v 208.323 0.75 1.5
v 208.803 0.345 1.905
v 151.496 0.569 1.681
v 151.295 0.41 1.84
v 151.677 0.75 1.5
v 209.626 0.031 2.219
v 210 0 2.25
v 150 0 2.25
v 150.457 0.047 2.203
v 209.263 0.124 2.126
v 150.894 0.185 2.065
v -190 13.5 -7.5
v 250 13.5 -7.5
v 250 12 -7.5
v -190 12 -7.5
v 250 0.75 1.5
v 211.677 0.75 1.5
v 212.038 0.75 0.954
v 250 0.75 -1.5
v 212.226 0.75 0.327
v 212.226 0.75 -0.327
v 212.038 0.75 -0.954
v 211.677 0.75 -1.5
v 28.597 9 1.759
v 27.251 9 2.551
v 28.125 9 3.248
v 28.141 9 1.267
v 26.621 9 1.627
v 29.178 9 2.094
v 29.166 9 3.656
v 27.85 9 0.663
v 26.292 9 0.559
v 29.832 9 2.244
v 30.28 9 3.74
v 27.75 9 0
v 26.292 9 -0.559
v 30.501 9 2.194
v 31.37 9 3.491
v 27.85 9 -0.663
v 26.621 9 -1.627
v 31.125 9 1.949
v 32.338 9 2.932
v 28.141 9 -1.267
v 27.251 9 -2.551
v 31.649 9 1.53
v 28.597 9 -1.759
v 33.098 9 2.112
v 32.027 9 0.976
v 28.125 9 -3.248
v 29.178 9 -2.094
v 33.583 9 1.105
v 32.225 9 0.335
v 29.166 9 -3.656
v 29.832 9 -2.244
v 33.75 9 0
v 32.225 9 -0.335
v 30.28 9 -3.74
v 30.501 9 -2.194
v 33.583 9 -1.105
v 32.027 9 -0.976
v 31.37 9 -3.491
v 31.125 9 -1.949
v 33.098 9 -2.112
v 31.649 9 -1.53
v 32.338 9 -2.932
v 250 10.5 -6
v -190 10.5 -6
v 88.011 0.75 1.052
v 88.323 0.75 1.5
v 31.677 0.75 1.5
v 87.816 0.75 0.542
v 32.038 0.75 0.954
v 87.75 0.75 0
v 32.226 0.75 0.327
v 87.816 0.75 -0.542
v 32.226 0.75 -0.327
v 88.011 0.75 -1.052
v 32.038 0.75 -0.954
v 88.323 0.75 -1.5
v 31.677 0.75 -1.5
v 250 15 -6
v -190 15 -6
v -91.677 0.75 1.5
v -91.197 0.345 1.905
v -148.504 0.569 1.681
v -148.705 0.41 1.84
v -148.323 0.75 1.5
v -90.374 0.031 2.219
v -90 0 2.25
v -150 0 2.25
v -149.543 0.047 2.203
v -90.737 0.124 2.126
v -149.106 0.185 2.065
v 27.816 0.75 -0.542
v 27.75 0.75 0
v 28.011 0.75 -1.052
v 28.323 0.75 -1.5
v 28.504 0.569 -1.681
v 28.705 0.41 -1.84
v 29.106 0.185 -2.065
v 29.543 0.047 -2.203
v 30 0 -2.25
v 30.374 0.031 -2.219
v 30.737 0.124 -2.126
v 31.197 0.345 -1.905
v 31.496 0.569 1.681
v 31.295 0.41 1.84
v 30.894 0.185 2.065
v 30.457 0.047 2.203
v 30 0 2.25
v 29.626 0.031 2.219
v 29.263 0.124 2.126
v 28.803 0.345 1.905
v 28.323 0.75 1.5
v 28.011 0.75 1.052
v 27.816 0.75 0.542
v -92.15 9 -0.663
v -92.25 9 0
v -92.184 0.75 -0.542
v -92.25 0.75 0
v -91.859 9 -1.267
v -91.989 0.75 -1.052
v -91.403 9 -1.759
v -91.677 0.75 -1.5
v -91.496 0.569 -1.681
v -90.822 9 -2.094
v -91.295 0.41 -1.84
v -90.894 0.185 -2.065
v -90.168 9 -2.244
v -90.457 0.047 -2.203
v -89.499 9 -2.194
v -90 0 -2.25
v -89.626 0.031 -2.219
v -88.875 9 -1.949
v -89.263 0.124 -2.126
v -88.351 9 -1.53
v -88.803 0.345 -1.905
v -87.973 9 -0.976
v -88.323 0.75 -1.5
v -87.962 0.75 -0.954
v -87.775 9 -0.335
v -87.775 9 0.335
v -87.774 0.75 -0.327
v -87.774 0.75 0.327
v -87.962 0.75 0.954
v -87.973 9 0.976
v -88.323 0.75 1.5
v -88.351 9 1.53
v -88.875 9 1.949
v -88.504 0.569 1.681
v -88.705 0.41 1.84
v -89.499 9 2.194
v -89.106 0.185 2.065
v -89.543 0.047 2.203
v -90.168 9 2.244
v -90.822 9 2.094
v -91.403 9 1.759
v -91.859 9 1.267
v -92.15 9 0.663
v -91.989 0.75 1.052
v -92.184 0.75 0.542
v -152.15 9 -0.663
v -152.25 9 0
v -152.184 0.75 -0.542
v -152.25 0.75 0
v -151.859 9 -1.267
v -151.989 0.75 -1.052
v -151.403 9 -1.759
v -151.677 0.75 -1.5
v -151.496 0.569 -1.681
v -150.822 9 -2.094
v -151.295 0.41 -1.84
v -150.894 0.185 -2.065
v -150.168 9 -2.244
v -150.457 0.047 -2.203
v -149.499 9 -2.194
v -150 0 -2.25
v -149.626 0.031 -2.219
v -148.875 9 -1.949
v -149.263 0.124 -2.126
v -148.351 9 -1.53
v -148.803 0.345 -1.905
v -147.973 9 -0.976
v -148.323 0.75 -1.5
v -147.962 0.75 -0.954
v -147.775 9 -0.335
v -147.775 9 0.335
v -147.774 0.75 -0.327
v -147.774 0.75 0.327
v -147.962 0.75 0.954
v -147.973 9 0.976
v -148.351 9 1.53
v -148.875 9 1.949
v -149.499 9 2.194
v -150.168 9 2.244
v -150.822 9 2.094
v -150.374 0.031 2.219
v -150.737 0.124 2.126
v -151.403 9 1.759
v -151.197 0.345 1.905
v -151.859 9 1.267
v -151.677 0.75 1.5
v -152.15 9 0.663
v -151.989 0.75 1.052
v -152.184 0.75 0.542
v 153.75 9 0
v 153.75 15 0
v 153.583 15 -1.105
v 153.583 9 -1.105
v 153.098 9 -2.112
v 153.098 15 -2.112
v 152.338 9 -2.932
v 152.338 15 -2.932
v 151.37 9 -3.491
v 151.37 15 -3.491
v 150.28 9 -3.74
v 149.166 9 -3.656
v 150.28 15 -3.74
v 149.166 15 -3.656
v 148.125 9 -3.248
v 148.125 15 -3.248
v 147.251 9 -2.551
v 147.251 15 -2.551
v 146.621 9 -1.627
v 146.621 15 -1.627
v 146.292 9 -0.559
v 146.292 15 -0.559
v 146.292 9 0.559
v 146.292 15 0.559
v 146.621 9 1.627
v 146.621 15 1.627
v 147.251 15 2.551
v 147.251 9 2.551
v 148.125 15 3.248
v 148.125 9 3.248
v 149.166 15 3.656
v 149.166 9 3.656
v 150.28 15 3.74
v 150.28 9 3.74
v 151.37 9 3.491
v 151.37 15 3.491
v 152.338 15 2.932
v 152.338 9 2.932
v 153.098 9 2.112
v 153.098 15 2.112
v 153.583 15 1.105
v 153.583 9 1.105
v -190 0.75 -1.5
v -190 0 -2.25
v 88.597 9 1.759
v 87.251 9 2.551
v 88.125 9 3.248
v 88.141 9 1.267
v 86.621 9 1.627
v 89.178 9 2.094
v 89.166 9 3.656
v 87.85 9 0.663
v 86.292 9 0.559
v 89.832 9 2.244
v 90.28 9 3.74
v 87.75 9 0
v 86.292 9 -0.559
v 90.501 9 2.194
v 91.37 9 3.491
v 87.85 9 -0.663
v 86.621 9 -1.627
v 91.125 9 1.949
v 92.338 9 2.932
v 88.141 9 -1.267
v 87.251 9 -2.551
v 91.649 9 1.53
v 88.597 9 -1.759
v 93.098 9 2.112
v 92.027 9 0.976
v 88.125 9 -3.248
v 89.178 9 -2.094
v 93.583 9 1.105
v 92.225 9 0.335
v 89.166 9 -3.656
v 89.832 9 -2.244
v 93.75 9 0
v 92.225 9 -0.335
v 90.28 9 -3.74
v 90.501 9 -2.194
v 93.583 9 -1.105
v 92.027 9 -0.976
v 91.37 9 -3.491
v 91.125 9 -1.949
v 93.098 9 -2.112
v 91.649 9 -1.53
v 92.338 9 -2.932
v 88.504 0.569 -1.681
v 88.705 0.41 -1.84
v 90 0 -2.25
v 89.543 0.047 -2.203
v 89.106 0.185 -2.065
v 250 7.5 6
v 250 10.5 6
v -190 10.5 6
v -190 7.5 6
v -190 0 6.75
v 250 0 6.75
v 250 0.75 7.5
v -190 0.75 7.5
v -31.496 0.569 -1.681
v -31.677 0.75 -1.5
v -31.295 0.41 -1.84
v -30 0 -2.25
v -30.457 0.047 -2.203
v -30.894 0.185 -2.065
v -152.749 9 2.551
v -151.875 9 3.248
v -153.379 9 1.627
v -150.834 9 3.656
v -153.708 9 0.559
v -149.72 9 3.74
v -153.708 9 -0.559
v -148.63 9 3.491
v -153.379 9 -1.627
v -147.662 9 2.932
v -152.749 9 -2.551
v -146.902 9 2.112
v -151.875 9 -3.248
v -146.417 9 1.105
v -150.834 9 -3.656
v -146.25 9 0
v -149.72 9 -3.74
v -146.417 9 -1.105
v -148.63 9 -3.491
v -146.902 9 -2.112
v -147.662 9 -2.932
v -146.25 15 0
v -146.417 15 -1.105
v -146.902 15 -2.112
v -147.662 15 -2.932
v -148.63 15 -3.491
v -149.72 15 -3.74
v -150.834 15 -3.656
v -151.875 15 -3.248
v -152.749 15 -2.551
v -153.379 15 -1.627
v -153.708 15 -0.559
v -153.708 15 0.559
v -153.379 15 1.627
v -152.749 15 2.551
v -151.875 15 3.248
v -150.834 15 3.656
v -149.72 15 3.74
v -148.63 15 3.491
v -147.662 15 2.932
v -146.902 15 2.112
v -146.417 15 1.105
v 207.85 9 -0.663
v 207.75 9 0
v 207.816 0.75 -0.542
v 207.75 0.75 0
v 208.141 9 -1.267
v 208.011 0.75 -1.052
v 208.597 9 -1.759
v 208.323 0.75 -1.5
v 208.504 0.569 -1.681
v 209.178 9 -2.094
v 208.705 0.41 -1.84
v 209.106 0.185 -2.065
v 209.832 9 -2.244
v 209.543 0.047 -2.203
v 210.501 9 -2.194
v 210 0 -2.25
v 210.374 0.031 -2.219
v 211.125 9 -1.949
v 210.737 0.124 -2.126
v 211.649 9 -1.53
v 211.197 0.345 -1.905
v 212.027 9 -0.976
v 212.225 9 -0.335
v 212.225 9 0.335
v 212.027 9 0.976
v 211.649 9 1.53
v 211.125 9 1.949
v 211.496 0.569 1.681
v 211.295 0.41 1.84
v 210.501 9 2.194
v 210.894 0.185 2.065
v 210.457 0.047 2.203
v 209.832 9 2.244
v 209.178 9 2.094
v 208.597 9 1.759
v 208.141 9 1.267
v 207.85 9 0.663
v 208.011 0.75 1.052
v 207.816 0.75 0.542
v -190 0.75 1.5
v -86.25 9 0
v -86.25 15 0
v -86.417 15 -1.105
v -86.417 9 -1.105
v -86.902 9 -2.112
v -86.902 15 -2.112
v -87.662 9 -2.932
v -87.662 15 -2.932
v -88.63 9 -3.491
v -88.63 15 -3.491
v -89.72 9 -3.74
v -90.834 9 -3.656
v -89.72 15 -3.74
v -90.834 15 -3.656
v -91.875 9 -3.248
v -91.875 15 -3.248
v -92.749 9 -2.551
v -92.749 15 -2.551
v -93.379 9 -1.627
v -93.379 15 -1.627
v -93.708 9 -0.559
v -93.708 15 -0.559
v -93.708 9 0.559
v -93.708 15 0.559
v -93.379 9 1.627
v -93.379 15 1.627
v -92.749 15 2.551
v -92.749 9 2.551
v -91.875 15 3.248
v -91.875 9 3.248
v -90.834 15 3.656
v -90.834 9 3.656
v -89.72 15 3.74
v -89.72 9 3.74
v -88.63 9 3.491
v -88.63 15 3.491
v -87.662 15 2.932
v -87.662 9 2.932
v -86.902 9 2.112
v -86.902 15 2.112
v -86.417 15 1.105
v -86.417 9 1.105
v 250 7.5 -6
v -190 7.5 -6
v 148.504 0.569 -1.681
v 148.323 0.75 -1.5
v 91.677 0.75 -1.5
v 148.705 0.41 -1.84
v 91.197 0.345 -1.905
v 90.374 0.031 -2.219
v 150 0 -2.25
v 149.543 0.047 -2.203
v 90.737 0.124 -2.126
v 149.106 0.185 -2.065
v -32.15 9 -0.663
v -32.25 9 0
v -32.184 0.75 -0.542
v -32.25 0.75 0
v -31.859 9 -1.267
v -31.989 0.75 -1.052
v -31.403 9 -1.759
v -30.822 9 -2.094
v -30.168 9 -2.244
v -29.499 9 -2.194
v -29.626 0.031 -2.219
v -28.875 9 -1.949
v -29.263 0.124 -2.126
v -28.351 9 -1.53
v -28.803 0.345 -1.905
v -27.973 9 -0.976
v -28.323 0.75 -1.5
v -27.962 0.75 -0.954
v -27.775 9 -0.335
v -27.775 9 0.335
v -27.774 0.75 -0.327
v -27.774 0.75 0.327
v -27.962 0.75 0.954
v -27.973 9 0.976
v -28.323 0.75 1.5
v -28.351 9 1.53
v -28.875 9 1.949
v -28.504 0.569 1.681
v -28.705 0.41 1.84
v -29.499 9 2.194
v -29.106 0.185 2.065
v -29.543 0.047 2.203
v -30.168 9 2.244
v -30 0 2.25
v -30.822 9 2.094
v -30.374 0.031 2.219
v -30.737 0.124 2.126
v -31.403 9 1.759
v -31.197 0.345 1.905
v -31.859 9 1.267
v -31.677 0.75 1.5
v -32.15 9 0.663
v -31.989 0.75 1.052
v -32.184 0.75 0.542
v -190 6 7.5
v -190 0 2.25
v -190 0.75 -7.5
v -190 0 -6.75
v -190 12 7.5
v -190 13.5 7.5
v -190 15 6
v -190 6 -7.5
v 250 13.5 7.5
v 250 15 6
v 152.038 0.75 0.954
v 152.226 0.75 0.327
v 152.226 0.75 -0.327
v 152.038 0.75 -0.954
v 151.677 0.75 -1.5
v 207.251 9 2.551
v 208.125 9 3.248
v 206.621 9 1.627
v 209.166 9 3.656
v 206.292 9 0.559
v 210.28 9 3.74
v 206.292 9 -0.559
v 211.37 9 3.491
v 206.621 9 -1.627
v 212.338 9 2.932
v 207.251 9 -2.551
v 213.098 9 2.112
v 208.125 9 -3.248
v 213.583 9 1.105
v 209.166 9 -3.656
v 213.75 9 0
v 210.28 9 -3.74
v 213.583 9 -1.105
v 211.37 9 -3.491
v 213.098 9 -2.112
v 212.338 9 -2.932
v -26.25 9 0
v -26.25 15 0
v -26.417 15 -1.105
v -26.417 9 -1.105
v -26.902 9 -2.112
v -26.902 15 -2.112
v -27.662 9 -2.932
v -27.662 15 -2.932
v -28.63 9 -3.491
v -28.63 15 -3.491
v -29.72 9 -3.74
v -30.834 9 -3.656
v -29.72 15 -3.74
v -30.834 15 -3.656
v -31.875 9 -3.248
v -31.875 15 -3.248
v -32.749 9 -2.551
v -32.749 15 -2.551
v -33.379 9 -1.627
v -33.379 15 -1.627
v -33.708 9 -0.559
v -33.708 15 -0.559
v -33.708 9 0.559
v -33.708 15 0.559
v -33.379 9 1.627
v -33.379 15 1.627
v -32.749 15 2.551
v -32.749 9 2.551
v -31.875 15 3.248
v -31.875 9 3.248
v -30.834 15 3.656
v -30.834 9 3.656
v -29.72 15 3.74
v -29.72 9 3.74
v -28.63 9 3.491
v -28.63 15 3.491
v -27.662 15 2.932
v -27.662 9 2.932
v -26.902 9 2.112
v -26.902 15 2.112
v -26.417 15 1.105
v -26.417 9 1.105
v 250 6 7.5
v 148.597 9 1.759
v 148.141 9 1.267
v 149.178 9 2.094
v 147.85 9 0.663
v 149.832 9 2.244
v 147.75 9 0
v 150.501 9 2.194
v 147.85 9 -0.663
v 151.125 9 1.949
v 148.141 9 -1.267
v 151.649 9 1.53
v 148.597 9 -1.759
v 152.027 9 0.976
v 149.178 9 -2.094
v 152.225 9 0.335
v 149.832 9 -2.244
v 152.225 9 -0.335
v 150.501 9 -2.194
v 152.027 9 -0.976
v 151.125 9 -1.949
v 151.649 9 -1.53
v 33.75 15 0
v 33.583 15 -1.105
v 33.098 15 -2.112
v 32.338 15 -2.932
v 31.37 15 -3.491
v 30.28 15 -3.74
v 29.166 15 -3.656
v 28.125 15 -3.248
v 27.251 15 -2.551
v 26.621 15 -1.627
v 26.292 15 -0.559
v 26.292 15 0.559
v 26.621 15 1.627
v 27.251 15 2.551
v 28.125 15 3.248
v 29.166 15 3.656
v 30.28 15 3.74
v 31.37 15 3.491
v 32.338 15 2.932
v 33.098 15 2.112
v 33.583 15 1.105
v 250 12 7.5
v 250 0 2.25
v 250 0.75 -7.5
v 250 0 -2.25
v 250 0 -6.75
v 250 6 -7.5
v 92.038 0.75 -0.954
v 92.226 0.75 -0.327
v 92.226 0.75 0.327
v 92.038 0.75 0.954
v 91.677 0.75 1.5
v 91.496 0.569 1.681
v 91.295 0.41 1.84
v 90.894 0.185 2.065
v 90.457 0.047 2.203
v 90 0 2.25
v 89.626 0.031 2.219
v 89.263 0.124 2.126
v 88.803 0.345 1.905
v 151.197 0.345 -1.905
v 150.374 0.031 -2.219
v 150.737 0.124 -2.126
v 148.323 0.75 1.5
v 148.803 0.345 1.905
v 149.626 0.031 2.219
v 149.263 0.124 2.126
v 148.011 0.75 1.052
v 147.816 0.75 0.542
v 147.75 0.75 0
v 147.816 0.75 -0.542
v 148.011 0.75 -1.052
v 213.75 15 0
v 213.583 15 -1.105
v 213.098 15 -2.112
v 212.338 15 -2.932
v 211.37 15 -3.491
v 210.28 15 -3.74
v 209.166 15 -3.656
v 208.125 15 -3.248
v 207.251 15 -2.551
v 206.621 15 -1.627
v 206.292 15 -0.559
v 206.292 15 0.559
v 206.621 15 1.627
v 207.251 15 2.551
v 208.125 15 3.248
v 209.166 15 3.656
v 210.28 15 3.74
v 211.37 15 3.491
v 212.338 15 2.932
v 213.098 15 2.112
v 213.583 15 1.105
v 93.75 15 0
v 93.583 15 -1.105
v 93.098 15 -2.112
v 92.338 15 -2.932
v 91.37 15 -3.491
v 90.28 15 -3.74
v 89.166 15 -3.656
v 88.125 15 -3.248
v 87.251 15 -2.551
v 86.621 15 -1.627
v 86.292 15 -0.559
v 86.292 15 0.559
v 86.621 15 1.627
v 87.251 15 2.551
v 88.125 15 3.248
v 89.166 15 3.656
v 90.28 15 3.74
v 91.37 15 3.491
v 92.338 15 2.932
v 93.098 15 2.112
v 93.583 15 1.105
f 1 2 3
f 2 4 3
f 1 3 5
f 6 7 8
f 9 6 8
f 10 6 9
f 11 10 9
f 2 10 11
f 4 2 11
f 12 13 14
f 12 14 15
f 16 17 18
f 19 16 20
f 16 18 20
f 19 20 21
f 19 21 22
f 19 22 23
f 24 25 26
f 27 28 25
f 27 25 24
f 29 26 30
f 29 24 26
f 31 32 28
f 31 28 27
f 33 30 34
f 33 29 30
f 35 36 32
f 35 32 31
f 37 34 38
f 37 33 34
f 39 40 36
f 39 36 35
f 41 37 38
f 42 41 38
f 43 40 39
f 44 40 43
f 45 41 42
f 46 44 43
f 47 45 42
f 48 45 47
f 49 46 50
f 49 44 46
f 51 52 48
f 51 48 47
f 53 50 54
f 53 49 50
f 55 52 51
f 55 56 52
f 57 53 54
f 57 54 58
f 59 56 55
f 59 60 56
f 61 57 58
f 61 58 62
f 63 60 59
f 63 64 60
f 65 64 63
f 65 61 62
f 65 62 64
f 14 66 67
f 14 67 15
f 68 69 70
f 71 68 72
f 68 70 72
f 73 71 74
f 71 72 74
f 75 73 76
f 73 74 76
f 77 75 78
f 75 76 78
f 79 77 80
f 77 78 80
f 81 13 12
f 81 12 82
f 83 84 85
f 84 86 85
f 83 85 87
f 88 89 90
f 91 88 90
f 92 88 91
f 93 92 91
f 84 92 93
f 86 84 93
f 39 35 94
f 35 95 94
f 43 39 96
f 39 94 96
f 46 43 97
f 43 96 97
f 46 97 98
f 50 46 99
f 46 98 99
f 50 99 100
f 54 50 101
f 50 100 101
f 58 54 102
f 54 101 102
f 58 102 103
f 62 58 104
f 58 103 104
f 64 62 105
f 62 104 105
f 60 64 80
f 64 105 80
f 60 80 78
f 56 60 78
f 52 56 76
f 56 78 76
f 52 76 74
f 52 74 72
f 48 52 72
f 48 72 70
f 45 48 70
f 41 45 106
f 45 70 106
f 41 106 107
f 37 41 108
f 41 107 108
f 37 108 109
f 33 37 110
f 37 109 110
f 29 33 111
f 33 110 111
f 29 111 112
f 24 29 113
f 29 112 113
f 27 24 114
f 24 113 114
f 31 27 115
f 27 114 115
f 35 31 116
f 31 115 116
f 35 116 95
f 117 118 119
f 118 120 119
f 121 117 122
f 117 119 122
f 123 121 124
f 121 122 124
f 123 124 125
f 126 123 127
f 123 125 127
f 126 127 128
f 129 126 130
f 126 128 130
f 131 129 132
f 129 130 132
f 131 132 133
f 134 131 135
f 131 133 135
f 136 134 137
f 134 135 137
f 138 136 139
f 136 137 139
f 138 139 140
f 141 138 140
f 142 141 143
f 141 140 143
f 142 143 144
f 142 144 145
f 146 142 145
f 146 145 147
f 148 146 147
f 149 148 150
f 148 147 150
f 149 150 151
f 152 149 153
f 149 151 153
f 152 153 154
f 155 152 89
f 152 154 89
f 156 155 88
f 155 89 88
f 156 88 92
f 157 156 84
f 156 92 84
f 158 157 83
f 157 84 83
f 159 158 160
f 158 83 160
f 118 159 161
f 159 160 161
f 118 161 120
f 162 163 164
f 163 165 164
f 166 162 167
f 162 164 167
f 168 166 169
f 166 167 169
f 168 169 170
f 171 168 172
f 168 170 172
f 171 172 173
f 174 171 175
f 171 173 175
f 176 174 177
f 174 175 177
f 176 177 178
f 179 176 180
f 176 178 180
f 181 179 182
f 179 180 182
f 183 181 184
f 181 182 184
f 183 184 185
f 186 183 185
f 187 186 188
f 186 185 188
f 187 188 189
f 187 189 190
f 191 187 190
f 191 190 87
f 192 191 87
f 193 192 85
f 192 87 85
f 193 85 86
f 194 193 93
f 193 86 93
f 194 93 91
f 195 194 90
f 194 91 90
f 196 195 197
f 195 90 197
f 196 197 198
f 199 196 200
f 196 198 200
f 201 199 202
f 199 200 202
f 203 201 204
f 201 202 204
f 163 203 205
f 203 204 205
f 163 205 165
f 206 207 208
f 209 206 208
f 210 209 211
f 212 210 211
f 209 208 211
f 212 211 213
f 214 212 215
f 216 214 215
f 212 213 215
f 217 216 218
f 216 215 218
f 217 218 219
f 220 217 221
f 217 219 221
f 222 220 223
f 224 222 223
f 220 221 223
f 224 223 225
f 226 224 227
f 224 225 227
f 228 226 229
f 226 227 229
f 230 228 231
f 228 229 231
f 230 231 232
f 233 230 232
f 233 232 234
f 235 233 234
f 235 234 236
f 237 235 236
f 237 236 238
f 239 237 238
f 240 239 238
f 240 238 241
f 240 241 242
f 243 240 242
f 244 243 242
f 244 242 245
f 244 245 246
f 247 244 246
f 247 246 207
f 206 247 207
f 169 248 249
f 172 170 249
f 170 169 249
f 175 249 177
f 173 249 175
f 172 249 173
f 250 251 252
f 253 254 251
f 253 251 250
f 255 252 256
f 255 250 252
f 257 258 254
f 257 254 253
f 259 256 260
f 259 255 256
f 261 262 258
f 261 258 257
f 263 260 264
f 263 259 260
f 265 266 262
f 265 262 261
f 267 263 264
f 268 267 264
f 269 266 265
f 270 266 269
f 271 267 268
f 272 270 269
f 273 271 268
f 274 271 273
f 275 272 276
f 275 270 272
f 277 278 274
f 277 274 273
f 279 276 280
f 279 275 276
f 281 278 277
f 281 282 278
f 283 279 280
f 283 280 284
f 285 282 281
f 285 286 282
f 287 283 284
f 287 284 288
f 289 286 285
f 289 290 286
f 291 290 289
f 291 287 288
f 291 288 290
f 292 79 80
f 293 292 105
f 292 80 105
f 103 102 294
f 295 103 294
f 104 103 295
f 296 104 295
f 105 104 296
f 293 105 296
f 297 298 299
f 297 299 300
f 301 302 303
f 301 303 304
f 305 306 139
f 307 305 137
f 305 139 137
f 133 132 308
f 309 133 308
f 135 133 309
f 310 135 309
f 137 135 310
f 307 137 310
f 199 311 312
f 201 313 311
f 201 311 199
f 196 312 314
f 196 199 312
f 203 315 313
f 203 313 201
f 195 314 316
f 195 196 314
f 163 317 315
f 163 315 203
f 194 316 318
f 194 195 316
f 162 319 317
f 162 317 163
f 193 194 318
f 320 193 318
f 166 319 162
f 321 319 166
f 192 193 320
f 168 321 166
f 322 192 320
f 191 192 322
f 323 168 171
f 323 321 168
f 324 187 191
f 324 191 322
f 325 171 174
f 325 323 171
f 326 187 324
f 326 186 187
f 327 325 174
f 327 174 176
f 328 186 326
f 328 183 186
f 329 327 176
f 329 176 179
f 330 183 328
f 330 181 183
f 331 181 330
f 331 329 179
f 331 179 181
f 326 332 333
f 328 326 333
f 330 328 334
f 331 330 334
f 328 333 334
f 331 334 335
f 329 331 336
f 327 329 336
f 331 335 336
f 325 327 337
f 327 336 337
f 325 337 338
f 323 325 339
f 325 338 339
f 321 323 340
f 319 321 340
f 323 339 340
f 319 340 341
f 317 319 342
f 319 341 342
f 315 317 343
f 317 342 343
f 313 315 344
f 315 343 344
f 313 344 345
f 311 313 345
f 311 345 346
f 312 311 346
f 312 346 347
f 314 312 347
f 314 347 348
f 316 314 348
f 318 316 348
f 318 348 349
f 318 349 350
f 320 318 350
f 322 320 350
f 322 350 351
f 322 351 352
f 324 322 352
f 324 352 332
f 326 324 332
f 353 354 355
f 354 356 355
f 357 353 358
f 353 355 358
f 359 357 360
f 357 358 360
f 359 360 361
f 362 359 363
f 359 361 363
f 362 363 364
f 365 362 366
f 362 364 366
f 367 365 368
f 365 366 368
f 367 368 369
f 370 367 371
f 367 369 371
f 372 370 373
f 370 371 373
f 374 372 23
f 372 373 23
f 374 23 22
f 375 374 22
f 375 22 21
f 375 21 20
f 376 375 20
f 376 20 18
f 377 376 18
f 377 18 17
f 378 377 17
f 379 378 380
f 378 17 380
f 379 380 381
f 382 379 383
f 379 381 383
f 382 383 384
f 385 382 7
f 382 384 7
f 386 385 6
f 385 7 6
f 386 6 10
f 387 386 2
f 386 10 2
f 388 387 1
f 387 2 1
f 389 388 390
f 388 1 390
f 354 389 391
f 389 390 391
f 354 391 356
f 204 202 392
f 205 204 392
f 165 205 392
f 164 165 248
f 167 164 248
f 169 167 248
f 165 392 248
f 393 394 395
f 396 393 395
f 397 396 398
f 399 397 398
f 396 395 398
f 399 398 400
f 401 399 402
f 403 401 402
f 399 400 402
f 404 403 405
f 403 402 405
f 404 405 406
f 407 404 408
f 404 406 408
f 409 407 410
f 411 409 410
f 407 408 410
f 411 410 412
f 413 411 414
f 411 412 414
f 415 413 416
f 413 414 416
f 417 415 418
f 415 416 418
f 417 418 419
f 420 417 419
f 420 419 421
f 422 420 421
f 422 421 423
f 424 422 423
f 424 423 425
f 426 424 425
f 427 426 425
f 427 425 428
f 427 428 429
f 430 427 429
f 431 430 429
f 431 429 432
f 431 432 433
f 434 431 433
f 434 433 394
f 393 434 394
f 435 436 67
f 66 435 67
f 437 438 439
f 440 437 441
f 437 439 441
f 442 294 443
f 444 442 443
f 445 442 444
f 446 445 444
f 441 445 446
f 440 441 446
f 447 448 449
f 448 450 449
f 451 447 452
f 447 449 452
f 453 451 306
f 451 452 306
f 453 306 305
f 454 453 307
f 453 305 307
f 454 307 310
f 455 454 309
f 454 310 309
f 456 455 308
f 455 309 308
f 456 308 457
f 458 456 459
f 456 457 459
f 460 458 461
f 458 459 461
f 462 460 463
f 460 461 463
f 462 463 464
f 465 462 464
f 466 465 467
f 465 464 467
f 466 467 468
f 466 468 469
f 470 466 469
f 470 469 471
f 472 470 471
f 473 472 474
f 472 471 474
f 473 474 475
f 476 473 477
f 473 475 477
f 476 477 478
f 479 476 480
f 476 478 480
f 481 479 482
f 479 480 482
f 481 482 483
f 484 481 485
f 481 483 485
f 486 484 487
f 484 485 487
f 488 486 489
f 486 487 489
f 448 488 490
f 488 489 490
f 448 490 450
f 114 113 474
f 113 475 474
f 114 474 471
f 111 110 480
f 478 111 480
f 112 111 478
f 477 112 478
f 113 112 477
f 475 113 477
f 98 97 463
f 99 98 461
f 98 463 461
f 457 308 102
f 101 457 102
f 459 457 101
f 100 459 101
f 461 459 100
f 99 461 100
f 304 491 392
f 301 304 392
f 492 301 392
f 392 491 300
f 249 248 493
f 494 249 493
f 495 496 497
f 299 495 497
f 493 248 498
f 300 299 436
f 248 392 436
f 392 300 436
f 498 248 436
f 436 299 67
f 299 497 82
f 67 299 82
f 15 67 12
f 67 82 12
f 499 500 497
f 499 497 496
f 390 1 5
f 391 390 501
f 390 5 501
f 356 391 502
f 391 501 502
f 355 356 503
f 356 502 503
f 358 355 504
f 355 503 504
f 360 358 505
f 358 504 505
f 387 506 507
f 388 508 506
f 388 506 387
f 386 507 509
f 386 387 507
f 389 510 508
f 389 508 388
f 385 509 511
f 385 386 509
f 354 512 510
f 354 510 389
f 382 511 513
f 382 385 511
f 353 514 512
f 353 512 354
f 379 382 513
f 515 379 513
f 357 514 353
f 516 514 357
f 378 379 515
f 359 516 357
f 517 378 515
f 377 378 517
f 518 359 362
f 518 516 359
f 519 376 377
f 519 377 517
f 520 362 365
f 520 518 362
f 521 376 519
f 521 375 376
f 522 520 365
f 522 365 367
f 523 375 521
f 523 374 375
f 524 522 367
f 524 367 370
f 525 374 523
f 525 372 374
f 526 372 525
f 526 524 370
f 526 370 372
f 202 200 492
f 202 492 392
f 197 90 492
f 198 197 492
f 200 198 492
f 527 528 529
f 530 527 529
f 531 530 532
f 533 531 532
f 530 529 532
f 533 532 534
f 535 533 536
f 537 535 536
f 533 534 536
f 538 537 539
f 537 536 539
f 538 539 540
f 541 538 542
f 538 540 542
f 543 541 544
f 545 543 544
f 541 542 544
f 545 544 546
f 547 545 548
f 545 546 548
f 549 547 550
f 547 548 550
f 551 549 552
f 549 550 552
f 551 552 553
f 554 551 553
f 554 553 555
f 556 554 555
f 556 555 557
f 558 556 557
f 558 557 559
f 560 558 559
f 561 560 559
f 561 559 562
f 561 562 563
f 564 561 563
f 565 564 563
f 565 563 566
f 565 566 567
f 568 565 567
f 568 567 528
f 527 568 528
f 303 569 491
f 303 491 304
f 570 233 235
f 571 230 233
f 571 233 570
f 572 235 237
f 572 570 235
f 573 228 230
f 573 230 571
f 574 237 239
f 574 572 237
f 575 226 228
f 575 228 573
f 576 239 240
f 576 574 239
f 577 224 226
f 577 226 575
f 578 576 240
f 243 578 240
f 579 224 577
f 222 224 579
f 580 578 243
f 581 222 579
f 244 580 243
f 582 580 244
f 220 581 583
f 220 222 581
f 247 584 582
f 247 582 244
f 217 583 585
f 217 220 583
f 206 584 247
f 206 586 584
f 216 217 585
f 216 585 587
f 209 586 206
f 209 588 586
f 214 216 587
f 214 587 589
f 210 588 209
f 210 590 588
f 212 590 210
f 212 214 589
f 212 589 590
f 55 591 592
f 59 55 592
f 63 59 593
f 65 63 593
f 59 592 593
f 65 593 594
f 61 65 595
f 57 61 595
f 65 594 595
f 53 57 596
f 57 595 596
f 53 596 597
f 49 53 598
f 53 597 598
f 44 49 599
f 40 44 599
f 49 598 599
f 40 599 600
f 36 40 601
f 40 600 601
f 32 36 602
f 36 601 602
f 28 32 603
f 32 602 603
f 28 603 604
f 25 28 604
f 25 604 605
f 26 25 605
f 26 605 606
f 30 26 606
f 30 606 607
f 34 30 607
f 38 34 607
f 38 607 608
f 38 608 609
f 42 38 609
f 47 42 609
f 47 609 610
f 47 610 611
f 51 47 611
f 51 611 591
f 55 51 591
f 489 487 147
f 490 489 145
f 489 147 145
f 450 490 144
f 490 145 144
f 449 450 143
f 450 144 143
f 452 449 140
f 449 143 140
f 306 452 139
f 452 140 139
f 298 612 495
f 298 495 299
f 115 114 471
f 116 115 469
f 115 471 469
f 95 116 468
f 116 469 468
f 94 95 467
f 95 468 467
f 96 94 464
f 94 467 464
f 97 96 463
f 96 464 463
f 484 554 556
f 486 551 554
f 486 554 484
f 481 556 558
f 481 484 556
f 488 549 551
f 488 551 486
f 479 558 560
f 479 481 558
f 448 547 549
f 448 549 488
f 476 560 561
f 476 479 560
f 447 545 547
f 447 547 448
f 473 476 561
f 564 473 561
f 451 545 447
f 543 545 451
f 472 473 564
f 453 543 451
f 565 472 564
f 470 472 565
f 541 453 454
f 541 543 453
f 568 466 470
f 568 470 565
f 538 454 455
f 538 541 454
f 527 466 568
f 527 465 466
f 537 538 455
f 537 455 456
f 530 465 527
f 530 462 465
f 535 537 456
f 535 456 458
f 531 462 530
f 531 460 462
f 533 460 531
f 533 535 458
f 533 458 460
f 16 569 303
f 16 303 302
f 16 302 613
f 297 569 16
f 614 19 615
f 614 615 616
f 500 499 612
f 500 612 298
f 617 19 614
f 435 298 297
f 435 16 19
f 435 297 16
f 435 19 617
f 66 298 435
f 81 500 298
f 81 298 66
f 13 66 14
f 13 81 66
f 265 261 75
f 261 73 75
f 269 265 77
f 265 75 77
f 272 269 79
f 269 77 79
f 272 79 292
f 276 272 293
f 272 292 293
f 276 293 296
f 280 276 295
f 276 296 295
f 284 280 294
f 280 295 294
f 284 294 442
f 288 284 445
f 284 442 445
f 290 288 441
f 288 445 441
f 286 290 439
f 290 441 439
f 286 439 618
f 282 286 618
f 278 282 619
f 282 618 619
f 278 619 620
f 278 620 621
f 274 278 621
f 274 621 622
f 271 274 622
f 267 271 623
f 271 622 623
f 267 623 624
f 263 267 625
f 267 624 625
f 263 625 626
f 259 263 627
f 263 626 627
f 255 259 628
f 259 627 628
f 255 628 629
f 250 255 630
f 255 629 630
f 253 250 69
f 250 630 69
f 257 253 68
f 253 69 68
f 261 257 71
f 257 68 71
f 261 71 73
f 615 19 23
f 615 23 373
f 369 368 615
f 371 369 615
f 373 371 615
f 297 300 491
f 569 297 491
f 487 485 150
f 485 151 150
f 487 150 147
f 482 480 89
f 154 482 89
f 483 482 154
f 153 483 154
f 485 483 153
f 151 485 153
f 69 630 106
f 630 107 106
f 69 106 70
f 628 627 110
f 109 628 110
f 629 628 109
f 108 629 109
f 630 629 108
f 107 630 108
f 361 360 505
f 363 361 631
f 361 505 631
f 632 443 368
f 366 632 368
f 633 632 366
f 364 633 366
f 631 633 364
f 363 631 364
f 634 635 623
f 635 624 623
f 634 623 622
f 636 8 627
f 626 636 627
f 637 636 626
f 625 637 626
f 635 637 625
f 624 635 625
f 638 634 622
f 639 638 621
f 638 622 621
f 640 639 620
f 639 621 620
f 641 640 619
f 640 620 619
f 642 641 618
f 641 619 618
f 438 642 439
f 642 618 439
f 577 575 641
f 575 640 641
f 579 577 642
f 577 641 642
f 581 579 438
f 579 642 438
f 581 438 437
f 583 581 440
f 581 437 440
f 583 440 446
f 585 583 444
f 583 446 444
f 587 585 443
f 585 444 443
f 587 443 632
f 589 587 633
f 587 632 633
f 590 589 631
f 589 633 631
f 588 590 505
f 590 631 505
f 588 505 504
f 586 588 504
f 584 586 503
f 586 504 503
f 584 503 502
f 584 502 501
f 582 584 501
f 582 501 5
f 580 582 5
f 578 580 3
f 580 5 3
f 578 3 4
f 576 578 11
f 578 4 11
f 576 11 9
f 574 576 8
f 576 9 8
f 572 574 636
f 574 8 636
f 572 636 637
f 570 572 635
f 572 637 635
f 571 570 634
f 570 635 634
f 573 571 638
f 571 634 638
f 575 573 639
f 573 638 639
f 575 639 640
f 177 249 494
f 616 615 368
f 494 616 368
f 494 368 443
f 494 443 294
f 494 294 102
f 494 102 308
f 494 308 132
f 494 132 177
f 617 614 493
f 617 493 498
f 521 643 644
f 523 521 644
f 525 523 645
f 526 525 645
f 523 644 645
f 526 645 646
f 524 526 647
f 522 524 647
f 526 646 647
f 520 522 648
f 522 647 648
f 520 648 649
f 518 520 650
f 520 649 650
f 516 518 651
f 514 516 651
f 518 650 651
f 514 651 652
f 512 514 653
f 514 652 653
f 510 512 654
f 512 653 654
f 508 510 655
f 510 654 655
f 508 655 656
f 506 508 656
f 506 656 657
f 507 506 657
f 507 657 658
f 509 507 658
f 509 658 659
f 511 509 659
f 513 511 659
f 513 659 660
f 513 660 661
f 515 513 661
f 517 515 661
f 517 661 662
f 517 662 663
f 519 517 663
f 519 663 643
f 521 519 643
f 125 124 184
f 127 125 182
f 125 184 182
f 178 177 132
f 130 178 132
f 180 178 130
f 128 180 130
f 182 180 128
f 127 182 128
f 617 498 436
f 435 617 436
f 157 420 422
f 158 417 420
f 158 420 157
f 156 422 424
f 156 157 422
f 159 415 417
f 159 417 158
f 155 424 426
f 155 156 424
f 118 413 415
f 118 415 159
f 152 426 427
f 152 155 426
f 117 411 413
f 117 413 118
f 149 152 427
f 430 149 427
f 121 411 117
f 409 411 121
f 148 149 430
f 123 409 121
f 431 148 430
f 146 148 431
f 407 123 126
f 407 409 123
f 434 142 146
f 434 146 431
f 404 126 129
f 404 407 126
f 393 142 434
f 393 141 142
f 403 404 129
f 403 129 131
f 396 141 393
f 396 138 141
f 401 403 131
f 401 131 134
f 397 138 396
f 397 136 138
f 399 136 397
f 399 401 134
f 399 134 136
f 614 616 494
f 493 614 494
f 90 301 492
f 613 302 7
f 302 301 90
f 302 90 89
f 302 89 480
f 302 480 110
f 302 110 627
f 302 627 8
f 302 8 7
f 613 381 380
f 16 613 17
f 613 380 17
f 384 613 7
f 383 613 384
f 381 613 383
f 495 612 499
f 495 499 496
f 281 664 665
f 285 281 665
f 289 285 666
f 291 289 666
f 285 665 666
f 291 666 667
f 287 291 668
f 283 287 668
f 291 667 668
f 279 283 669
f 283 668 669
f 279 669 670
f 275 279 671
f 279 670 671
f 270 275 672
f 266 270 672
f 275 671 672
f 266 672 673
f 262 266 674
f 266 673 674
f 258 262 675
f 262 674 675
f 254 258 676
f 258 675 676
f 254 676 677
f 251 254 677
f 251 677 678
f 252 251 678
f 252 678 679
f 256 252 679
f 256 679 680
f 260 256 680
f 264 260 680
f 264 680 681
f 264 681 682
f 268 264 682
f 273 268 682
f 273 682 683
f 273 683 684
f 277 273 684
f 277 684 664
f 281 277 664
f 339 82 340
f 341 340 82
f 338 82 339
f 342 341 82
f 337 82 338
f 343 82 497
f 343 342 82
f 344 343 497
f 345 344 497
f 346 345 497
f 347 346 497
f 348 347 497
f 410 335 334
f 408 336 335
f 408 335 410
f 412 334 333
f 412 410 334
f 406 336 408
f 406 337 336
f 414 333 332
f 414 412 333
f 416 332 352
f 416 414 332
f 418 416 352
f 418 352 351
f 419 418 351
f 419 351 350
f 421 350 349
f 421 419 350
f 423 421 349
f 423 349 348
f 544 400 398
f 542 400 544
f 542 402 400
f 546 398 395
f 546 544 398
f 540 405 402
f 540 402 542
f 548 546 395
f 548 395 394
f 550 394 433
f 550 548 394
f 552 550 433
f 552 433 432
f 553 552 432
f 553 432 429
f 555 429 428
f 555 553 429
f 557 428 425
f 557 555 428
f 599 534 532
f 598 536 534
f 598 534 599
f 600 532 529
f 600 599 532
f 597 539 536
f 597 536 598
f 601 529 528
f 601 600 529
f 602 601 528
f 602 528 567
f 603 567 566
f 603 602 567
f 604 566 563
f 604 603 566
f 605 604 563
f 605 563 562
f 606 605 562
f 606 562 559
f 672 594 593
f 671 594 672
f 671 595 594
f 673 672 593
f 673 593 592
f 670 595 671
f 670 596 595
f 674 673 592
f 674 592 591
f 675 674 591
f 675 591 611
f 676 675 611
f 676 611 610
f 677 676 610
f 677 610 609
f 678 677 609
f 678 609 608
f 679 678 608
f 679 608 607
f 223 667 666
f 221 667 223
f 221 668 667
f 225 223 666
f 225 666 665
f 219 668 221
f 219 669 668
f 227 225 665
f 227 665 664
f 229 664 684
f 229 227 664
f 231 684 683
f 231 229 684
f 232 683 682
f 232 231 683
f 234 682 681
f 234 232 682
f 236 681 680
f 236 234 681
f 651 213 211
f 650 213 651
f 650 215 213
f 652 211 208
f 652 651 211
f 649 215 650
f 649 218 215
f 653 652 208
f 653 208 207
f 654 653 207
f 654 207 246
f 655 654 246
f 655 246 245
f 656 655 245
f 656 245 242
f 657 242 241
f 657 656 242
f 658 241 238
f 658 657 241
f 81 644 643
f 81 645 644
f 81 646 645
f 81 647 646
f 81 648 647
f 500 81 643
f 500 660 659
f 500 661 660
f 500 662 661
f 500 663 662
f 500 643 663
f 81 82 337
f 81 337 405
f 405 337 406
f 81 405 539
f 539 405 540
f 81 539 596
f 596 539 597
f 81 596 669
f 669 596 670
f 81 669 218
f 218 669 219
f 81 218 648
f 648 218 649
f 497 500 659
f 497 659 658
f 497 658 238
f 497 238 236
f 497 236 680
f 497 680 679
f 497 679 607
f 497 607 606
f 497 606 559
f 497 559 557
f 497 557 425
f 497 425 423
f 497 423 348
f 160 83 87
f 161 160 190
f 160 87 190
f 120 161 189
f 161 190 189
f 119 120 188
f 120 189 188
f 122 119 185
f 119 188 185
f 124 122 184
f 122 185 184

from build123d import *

# Parameters (mm, degrees)
BOSS_EXTRUDE1_DEPTH                              = 440
CUT_EXTRUDE1_DEPTH                               = 441.332899634
CBORE_FOR_M4_HEX_HEAD_MACHINE_SCREW1_D           = 4.5
CBORE_FOR_M4_HEX_HEAD_MACHINE_SCREW1_DEPTH       = 15
CBORE_FOR_M4_HEX_HEAD_MACHINE_SCREW1_CBORE_D     = 7.5
CBORE_FOR_M4_HEX_HEAD_MACHINE_SCREW1_CBORE_DEPTH = 6
CHAMFER1_SIZE                                    = 0.75
CHAMFER2_SIZE                                    = 1.060660172


with BuildPart() as part:
    # Sketch1 → Boss-Extrude1 (new body)
    with BuildSketch(Plane(origin=(250, 0, 0), x_dir=(0, 0, -1), z_dir=(1, 0, 0))):
        Polygon((-7.5, 6), (-7.5, 0), (7.5, 0), (7.5, 6), (6, 7.5), (6, 10.5), (8.25, 12.75), (6, 15), (-6, 15), (-8.25, 12.75), (-6, 10.5), (-6, 7.5), align=None)
    extrude(amount=-BOSS_EXTRUDE1_DEPTH)

    # Sketch2 → Cut-Extrude1 (cut, through all)
    with BuildSketch(Plane.ZY.offset(190)):
        Polygon((-2.25, 0), (2.25, 0), (1.5, 0.75), (-1.5, 0.75), align=None)
    extrude(amount=-CUT_EXTRUDE1_DEPTH, mode=Mode.SUBTRACT)

    # CBORE for M4 Hex Head Machine Screw1
    with Locations(Plane(origin=(0, 15, 0), x_dir=(1, 0, 0), z_dir=(0, 1, 0))):
        with Locations((210, 0), (150, 0), (90, 0), (30, 0), (-30, 0), (-90, 0), (-150, 0), (-210, 0)):
            CounterBoreHole(CBORE_FOR_M4_HEX_HEAD_MACHINE_SCREW1_D / 2, CBORE_FOR_M4_HEX_HEAD_MACHINE_SCREW1_CBORE_D / 2, CBORE_FOR_M4_HEX_HEAD_MACHINE_SCREW1_CBORE_DEPTH, depth=CBORE_FOR_M4_HEX_HEAD_MACHINE_SCREW1_DEPTH)

    # Chamfer1
    chamfer1_edges = [part.edges().sort_by_distance(p)[0] for p in [
        (30, 0, -7.5),
        (30, 0, 7.5),
    ]]
    chamfer(chamfer1_edges, length=CHAMFER1_SIZE)

    # Chamfer2
    chamfer2_edges = [part.edges().sort_by_distance(p)[0] for p in [
        (30, 12.75, 8.25),
        (30, 12.75, -8.25),
    ]]
    chamfer(chamfer2_edges, length=CHAMFER2_SIZE)


solid = part.part
